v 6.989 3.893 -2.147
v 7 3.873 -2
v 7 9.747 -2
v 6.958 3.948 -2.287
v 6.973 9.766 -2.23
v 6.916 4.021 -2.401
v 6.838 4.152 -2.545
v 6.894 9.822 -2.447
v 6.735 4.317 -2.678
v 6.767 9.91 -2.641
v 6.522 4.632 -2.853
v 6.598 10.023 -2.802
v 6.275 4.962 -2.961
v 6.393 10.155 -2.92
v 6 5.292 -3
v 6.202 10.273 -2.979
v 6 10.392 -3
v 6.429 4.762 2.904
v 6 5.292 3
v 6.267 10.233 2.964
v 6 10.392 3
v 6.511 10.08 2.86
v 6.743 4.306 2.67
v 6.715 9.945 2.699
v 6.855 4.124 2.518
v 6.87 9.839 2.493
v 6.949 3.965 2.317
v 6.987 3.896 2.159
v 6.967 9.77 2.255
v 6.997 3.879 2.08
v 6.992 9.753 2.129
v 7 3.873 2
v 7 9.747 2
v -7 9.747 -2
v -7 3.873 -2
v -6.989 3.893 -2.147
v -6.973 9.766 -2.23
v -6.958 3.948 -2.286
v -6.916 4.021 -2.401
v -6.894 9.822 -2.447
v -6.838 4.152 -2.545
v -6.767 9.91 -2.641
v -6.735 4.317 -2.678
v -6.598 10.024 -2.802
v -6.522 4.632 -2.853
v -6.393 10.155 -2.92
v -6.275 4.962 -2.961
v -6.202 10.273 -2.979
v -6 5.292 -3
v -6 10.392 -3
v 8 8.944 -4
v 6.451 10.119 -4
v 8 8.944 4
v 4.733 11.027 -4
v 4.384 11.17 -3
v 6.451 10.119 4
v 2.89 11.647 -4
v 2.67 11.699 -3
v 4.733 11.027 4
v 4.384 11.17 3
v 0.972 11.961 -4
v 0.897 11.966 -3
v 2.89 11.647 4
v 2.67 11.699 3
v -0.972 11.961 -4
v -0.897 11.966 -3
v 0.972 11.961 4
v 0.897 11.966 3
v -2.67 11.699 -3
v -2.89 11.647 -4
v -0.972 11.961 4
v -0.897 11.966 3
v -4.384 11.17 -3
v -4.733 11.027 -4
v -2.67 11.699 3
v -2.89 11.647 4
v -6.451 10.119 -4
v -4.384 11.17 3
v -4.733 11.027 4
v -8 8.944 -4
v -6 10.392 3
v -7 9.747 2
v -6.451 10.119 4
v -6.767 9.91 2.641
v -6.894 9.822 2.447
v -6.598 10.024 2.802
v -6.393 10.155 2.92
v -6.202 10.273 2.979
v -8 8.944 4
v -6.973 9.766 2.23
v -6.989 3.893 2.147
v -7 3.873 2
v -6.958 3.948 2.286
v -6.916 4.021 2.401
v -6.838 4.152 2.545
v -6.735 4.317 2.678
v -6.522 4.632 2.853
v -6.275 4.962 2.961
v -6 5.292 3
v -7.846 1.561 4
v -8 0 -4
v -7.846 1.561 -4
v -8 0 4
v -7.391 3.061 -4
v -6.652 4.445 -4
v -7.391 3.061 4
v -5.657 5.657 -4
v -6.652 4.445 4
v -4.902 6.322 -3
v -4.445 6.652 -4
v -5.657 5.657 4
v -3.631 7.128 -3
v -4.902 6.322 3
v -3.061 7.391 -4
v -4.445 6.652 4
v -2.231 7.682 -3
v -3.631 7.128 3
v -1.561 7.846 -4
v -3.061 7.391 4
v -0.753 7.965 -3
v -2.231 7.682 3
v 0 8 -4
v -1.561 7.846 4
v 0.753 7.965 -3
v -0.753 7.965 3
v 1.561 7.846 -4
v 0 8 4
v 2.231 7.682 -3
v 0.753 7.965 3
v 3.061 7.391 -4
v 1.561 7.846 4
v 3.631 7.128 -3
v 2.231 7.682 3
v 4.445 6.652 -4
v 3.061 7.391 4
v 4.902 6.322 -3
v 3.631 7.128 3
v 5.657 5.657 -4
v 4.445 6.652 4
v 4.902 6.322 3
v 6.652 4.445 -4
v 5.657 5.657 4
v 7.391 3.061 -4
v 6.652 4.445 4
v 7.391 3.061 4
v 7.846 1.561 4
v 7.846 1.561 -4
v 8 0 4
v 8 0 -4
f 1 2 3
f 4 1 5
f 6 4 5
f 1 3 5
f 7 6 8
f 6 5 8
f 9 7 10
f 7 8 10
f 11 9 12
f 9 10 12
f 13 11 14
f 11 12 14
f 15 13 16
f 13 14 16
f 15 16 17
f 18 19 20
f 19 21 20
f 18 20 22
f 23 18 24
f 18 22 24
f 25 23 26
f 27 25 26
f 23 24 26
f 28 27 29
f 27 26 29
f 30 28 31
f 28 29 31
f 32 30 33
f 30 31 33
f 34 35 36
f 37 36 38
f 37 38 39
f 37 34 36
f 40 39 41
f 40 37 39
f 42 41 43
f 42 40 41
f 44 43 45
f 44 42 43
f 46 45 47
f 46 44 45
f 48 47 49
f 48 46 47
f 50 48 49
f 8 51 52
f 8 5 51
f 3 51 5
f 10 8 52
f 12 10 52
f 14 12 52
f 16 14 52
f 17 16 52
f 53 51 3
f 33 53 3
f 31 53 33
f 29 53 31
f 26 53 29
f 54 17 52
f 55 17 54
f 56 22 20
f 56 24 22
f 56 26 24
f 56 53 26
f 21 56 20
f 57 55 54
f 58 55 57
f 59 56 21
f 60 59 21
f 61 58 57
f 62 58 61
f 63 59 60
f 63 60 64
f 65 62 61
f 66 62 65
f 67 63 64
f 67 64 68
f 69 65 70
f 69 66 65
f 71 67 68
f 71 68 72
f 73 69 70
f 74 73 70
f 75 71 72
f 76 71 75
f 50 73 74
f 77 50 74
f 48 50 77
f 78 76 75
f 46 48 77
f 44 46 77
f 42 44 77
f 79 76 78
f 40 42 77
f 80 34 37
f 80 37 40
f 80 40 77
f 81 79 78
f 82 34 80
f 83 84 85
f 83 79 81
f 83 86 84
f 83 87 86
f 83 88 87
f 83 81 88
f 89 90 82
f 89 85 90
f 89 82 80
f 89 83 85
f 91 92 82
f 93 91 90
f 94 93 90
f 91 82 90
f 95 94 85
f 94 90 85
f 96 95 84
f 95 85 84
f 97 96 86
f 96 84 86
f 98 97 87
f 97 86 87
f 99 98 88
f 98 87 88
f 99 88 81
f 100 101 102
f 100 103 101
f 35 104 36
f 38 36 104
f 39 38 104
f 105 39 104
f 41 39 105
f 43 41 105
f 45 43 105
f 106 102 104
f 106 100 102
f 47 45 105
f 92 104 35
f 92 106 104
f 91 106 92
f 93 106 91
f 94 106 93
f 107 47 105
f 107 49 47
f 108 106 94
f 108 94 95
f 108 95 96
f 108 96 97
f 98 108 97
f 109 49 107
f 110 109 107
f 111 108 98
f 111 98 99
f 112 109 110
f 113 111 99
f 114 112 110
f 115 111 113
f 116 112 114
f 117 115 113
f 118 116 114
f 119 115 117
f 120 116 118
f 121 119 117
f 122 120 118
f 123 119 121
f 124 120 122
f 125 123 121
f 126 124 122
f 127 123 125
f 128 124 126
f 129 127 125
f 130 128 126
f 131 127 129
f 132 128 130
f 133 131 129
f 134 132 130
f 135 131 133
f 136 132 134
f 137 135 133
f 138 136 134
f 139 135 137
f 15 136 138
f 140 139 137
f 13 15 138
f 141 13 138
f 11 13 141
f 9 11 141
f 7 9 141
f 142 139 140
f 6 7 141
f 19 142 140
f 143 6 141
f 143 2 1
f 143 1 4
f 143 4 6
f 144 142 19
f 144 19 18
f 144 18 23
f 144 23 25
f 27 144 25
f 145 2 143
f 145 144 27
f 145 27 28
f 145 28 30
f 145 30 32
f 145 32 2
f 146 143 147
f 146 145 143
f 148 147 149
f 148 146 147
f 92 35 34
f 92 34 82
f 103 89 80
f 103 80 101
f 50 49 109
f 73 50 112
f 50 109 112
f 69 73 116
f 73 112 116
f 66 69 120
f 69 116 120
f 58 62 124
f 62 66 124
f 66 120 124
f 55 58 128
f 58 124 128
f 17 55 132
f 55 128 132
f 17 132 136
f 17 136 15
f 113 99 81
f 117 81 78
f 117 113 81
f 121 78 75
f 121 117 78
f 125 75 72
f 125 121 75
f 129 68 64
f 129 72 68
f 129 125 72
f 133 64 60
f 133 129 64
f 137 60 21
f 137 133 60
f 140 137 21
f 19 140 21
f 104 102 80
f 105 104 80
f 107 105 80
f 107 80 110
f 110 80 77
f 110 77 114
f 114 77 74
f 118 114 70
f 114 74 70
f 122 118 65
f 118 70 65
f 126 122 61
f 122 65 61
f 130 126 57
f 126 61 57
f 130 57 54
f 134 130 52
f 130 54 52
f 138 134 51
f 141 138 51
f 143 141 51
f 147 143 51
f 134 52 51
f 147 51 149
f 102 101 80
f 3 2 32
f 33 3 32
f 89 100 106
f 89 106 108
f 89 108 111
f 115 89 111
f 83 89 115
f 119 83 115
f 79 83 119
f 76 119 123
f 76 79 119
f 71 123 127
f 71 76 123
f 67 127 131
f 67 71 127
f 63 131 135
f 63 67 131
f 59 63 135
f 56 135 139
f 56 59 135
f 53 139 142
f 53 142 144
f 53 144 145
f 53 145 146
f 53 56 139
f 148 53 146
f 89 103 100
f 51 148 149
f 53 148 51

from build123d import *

# Parameters (mm, degrees)
F1_DEPTH      = 4
F1_DEPTH_BACK = 4
F2_W          = 14
F2_H          = 6
F3_DEPTH      = 25
F4_R          = 1


with BuildPart() as f1:
    # F0 (on Top) → F1 (new body, two sides)
    with BuildSketch(Plane.XY) as f1_sk:
        with BuildLine():
            Line((8, 0), (8, 8.944272))
            ThreePointArc((8, 8.944272), (0, 12), (-8, 8.944272))
            Line((-8, 8.944272), (-8, 0))
            ThreePointArc((-8, 0), (0, 8), (8, 0))
        make_face()
    extrude(amount=F1_DEPTH)
    extrude(f1_sk.sketch, amount=-F1_DEPTH_BACK)

    # F2 (on Front) → F3 (cut)
    with BuildSketch(Plane.XZ):
        Rectangle(F2_W, F2_H)
    extrude(amount=-F3_DEPTH, mode=Mode.SUBTRACT)

    # F4
    f4_edges = [f1.edges().sort_by_distance(p)[0] for p in [
        (-7, 6.809889, 3),
        (-7, 6.809889, -3),
        (7, 6.809889, -3),
        (7, 6.809889, 3),
    ]]
    fillet(f4_edges, radius=F4_R)


solid = f1.part
